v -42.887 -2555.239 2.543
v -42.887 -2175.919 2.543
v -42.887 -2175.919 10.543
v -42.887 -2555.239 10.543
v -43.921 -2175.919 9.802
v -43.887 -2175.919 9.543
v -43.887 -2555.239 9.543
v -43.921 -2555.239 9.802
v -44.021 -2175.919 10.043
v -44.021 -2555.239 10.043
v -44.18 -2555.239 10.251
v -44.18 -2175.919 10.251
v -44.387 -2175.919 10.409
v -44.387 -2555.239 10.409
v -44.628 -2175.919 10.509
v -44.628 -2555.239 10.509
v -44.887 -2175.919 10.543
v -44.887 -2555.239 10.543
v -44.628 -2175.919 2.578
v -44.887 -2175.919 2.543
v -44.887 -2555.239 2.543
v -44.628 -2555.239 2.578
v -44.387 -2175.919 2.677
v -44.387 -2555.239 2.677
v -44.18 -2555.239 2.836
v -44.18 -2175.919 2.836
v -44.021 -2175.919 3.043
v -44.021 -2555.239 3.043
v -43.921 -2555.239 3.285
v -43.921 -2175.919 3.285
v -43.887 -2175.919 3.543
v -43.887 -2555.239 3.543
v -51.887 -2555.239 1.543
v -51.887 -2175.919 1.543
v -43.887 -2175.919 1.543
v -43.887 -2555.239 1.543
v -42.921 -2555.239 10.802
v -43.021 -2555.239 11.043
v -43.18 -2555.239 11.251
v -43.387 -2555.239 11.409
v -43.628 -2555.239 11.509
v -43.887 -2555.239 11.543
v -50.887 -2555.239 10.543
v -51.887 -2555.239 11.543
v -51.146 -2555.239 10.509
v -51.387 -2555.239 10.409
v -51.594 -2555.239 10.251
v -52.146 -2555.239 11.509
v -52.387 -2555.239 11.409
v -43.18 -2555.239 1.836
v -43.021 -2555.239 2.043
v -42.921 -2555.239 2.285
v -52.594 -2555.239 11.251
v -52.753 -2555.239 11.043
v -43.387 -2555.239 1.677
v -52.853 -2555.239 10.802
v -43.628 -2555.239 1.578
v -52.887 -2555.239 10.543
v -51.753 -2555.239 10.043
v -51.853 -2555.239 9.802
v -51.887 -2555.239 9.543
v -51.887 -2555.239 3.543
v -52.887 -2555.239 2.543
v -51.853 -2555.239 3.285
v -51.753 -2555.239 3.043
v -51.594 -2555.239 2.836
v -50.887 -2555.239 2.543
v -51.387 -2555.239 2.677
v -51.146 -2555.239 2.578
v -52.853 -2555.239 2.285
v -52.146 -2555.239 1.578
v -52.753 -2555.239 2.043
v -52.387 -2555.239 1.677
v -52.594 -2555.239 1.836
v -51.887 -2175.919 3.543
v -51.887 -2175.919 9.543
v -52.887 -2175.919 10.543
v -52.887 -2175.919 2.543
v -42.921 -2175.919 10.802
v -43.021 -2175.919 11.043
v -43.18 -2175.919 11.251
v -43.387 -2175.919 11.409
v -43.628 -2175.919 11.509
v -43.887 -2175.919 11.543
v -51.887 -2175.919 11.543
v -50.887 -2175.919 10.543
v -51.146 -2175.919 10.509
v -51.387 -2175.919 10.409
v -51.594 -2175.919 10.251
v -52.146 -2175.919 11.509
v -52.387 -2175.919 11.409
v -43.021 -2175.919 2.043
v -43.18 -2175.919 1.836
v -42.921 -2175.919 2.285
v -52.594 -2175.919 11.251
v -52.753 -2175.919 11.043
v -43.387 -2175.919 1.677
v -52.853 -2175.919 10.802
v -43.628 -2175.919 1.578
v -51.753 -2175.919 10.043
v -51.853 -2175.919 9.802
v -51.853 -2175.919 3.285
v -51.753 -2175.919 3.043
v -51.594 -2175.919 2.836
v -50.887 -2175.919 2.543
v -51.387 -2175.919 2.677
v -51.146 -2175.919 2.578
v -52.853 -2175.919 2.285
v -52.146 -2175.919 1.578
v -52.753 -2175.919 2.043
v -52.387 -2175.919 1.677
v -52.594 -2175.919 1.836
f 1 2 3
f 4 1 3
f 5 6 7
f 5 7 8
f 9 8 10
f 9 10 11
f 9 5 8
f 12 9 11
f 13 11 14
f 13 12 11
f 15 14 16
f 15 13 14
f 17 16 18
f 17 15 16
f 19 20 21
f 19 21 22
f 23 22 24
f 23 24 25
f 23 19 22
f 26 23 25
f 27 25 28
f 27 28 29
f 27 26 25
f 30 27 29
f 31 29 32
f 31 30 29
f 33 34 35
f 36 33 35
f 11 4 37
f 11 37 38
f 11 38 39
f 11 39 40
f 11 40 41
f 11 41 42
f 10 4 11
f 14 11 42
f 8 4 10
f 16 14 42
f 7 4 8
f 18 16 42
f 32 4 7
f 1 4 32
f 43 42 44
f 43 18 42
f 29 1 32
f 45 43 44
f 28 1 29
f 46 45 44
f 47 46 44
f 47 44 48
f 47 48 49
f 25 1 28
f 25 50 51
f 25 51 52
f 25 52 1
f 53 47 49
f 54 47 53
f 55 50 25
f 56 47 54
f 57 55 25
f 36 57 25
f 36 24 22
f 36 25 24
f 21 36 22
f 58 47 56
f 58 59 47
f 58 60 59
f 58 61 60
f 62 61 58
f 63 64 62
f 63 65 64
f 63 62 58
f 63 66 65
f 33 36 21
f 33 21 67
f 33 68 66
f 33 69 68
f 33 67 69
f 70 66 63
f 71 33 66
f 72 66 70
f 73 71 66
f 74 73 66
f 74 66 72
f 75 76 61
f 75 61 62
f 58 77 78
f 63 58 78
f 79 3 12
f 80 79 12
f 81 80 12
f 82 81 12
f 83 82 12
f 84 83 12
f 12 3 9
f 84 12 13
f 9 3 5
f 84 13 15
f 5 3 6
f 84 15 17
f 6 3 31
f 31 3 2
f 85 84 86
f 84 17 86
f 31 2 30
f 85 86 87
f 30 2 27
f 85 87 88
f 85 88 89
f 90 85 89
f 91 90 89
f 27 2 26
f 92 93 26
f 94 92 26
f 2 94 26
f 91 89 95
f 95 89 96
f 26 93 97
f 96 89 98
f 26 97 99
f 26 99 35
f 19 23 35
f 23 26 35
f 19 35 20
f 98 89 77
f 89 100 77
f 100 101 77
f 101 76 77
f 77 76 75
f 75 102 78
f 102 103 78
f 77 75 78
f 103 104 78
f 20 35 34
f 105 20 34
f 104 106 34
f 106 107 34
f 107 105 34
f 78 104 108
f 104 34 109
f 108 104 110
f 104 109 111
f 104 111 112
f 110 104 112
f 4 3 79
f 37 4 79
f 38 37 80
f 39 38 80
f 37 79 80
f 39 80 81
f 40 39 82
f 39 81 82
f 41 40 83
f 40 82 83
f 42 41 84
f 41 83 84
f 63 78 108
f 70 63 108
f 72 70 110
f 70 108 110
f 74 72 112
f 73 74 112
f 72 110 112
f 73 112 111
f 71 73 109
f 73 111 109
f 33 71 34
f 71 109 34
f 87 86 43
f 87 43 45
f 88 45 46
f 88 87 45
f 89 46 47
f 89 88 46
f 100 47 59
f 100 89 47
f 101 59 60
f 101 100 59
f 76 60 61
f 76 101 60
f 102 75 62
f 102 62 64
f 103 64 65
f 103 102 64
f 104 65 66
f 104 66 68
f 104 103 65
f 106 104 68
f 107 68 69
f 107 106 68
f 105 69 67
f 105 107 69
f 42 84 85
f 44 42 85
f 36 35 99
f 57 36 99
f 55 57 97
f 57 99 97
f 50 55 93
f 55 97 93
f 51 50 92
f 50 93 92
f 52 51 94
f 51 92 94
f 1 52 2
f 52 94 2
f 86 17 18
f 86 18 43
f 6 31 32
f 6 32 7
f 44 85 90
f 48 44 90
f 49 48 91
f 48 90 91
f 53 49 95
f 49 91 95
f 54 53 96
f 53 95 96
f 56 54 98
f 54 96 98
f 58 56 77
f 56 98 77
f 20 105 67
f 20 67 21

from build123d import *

# Parameters (mm, degrees)
BOSS_EXTRUDE1_START = -2175.918735
BOSS_EXTRUDE1_DEPTH = 379.319789155


with BuildPart() as part:
    # Sketch1 → Boss-Extrude1 (new body)
    with BuildSketch(Plane(origin=(0, 0, 0), x_dir=(1, 0, 0), z_dir=(0, 1, 0)).offset(BOSS_EXTRUDE1_START)):
        with BuildLine():
            Line((-51.887039023, -1.543455886), (-43.887039023, -1.543455886))
            ThreePointArc((-43.887039023, -1.543455886), (-43.179932241, -1.836349105), (-42.887039023, -2.543455886))
            Line((-42.887039023, -2.543455886), (-42.887039023, -10.543455886))
            ThreePointArc((-42.887039023, -10.543455886), (-43.179932241, -11.250562667), (-43.887039023, -11.543455886))
            Line((-43.887039023, -11.543455886), (-51.887039023, -11.543455886))
            ThreePointArc((-51.887039023, -11.543455886), (-52.594145804, -11.250562667), (-52.887039023, -10.543455886))
            Line((-52.887039023, -10.543455886), (-52.887039023, -2.543455886))
            ThreePointArc((-52.887039023, -2.543455886), (-52.594145804, -1.836349105), (-51.887039023, -1.543455886))
        make_face()
        with BuildLine():
            Line((-50.887039023, -2.543455886), (-44.887039023, -2.543455886))
            ThreePointArc((-44.887039023, -2.543455886), (-44.179932241, -2.836349105), (-43.887039023, -3.543455886))
            Line((-43.887039023, -3.543455886), (-43.887039023, -9.543455886))
            ThreePointArc((-43.887039023, -9.543455886), (-44.179932241, -10.250562667), (-44.887039023, -10.543455886))
            Line((-44.887039023, -10.543455886), (-50.887039023, -10.543455886))
            ThreePointArc((-50.887039023, -10.543455886), (-51.594145804, -10.250562667), (-51.887039023, -9.543455886))
            Line((-51.887039023, -9.543455886), (-51.887039023, -3.543455886))
            ThreePointArc((-51.887039023, -3.543455886), (-51.594145804, -2.836349105), (-50.887039023, -2.543455886))
        make_face(mode=Mode.SUBTRACT)
    extrude(amount=-BOSS_EXTRUDE1_DEPTH)


solid = part.part
